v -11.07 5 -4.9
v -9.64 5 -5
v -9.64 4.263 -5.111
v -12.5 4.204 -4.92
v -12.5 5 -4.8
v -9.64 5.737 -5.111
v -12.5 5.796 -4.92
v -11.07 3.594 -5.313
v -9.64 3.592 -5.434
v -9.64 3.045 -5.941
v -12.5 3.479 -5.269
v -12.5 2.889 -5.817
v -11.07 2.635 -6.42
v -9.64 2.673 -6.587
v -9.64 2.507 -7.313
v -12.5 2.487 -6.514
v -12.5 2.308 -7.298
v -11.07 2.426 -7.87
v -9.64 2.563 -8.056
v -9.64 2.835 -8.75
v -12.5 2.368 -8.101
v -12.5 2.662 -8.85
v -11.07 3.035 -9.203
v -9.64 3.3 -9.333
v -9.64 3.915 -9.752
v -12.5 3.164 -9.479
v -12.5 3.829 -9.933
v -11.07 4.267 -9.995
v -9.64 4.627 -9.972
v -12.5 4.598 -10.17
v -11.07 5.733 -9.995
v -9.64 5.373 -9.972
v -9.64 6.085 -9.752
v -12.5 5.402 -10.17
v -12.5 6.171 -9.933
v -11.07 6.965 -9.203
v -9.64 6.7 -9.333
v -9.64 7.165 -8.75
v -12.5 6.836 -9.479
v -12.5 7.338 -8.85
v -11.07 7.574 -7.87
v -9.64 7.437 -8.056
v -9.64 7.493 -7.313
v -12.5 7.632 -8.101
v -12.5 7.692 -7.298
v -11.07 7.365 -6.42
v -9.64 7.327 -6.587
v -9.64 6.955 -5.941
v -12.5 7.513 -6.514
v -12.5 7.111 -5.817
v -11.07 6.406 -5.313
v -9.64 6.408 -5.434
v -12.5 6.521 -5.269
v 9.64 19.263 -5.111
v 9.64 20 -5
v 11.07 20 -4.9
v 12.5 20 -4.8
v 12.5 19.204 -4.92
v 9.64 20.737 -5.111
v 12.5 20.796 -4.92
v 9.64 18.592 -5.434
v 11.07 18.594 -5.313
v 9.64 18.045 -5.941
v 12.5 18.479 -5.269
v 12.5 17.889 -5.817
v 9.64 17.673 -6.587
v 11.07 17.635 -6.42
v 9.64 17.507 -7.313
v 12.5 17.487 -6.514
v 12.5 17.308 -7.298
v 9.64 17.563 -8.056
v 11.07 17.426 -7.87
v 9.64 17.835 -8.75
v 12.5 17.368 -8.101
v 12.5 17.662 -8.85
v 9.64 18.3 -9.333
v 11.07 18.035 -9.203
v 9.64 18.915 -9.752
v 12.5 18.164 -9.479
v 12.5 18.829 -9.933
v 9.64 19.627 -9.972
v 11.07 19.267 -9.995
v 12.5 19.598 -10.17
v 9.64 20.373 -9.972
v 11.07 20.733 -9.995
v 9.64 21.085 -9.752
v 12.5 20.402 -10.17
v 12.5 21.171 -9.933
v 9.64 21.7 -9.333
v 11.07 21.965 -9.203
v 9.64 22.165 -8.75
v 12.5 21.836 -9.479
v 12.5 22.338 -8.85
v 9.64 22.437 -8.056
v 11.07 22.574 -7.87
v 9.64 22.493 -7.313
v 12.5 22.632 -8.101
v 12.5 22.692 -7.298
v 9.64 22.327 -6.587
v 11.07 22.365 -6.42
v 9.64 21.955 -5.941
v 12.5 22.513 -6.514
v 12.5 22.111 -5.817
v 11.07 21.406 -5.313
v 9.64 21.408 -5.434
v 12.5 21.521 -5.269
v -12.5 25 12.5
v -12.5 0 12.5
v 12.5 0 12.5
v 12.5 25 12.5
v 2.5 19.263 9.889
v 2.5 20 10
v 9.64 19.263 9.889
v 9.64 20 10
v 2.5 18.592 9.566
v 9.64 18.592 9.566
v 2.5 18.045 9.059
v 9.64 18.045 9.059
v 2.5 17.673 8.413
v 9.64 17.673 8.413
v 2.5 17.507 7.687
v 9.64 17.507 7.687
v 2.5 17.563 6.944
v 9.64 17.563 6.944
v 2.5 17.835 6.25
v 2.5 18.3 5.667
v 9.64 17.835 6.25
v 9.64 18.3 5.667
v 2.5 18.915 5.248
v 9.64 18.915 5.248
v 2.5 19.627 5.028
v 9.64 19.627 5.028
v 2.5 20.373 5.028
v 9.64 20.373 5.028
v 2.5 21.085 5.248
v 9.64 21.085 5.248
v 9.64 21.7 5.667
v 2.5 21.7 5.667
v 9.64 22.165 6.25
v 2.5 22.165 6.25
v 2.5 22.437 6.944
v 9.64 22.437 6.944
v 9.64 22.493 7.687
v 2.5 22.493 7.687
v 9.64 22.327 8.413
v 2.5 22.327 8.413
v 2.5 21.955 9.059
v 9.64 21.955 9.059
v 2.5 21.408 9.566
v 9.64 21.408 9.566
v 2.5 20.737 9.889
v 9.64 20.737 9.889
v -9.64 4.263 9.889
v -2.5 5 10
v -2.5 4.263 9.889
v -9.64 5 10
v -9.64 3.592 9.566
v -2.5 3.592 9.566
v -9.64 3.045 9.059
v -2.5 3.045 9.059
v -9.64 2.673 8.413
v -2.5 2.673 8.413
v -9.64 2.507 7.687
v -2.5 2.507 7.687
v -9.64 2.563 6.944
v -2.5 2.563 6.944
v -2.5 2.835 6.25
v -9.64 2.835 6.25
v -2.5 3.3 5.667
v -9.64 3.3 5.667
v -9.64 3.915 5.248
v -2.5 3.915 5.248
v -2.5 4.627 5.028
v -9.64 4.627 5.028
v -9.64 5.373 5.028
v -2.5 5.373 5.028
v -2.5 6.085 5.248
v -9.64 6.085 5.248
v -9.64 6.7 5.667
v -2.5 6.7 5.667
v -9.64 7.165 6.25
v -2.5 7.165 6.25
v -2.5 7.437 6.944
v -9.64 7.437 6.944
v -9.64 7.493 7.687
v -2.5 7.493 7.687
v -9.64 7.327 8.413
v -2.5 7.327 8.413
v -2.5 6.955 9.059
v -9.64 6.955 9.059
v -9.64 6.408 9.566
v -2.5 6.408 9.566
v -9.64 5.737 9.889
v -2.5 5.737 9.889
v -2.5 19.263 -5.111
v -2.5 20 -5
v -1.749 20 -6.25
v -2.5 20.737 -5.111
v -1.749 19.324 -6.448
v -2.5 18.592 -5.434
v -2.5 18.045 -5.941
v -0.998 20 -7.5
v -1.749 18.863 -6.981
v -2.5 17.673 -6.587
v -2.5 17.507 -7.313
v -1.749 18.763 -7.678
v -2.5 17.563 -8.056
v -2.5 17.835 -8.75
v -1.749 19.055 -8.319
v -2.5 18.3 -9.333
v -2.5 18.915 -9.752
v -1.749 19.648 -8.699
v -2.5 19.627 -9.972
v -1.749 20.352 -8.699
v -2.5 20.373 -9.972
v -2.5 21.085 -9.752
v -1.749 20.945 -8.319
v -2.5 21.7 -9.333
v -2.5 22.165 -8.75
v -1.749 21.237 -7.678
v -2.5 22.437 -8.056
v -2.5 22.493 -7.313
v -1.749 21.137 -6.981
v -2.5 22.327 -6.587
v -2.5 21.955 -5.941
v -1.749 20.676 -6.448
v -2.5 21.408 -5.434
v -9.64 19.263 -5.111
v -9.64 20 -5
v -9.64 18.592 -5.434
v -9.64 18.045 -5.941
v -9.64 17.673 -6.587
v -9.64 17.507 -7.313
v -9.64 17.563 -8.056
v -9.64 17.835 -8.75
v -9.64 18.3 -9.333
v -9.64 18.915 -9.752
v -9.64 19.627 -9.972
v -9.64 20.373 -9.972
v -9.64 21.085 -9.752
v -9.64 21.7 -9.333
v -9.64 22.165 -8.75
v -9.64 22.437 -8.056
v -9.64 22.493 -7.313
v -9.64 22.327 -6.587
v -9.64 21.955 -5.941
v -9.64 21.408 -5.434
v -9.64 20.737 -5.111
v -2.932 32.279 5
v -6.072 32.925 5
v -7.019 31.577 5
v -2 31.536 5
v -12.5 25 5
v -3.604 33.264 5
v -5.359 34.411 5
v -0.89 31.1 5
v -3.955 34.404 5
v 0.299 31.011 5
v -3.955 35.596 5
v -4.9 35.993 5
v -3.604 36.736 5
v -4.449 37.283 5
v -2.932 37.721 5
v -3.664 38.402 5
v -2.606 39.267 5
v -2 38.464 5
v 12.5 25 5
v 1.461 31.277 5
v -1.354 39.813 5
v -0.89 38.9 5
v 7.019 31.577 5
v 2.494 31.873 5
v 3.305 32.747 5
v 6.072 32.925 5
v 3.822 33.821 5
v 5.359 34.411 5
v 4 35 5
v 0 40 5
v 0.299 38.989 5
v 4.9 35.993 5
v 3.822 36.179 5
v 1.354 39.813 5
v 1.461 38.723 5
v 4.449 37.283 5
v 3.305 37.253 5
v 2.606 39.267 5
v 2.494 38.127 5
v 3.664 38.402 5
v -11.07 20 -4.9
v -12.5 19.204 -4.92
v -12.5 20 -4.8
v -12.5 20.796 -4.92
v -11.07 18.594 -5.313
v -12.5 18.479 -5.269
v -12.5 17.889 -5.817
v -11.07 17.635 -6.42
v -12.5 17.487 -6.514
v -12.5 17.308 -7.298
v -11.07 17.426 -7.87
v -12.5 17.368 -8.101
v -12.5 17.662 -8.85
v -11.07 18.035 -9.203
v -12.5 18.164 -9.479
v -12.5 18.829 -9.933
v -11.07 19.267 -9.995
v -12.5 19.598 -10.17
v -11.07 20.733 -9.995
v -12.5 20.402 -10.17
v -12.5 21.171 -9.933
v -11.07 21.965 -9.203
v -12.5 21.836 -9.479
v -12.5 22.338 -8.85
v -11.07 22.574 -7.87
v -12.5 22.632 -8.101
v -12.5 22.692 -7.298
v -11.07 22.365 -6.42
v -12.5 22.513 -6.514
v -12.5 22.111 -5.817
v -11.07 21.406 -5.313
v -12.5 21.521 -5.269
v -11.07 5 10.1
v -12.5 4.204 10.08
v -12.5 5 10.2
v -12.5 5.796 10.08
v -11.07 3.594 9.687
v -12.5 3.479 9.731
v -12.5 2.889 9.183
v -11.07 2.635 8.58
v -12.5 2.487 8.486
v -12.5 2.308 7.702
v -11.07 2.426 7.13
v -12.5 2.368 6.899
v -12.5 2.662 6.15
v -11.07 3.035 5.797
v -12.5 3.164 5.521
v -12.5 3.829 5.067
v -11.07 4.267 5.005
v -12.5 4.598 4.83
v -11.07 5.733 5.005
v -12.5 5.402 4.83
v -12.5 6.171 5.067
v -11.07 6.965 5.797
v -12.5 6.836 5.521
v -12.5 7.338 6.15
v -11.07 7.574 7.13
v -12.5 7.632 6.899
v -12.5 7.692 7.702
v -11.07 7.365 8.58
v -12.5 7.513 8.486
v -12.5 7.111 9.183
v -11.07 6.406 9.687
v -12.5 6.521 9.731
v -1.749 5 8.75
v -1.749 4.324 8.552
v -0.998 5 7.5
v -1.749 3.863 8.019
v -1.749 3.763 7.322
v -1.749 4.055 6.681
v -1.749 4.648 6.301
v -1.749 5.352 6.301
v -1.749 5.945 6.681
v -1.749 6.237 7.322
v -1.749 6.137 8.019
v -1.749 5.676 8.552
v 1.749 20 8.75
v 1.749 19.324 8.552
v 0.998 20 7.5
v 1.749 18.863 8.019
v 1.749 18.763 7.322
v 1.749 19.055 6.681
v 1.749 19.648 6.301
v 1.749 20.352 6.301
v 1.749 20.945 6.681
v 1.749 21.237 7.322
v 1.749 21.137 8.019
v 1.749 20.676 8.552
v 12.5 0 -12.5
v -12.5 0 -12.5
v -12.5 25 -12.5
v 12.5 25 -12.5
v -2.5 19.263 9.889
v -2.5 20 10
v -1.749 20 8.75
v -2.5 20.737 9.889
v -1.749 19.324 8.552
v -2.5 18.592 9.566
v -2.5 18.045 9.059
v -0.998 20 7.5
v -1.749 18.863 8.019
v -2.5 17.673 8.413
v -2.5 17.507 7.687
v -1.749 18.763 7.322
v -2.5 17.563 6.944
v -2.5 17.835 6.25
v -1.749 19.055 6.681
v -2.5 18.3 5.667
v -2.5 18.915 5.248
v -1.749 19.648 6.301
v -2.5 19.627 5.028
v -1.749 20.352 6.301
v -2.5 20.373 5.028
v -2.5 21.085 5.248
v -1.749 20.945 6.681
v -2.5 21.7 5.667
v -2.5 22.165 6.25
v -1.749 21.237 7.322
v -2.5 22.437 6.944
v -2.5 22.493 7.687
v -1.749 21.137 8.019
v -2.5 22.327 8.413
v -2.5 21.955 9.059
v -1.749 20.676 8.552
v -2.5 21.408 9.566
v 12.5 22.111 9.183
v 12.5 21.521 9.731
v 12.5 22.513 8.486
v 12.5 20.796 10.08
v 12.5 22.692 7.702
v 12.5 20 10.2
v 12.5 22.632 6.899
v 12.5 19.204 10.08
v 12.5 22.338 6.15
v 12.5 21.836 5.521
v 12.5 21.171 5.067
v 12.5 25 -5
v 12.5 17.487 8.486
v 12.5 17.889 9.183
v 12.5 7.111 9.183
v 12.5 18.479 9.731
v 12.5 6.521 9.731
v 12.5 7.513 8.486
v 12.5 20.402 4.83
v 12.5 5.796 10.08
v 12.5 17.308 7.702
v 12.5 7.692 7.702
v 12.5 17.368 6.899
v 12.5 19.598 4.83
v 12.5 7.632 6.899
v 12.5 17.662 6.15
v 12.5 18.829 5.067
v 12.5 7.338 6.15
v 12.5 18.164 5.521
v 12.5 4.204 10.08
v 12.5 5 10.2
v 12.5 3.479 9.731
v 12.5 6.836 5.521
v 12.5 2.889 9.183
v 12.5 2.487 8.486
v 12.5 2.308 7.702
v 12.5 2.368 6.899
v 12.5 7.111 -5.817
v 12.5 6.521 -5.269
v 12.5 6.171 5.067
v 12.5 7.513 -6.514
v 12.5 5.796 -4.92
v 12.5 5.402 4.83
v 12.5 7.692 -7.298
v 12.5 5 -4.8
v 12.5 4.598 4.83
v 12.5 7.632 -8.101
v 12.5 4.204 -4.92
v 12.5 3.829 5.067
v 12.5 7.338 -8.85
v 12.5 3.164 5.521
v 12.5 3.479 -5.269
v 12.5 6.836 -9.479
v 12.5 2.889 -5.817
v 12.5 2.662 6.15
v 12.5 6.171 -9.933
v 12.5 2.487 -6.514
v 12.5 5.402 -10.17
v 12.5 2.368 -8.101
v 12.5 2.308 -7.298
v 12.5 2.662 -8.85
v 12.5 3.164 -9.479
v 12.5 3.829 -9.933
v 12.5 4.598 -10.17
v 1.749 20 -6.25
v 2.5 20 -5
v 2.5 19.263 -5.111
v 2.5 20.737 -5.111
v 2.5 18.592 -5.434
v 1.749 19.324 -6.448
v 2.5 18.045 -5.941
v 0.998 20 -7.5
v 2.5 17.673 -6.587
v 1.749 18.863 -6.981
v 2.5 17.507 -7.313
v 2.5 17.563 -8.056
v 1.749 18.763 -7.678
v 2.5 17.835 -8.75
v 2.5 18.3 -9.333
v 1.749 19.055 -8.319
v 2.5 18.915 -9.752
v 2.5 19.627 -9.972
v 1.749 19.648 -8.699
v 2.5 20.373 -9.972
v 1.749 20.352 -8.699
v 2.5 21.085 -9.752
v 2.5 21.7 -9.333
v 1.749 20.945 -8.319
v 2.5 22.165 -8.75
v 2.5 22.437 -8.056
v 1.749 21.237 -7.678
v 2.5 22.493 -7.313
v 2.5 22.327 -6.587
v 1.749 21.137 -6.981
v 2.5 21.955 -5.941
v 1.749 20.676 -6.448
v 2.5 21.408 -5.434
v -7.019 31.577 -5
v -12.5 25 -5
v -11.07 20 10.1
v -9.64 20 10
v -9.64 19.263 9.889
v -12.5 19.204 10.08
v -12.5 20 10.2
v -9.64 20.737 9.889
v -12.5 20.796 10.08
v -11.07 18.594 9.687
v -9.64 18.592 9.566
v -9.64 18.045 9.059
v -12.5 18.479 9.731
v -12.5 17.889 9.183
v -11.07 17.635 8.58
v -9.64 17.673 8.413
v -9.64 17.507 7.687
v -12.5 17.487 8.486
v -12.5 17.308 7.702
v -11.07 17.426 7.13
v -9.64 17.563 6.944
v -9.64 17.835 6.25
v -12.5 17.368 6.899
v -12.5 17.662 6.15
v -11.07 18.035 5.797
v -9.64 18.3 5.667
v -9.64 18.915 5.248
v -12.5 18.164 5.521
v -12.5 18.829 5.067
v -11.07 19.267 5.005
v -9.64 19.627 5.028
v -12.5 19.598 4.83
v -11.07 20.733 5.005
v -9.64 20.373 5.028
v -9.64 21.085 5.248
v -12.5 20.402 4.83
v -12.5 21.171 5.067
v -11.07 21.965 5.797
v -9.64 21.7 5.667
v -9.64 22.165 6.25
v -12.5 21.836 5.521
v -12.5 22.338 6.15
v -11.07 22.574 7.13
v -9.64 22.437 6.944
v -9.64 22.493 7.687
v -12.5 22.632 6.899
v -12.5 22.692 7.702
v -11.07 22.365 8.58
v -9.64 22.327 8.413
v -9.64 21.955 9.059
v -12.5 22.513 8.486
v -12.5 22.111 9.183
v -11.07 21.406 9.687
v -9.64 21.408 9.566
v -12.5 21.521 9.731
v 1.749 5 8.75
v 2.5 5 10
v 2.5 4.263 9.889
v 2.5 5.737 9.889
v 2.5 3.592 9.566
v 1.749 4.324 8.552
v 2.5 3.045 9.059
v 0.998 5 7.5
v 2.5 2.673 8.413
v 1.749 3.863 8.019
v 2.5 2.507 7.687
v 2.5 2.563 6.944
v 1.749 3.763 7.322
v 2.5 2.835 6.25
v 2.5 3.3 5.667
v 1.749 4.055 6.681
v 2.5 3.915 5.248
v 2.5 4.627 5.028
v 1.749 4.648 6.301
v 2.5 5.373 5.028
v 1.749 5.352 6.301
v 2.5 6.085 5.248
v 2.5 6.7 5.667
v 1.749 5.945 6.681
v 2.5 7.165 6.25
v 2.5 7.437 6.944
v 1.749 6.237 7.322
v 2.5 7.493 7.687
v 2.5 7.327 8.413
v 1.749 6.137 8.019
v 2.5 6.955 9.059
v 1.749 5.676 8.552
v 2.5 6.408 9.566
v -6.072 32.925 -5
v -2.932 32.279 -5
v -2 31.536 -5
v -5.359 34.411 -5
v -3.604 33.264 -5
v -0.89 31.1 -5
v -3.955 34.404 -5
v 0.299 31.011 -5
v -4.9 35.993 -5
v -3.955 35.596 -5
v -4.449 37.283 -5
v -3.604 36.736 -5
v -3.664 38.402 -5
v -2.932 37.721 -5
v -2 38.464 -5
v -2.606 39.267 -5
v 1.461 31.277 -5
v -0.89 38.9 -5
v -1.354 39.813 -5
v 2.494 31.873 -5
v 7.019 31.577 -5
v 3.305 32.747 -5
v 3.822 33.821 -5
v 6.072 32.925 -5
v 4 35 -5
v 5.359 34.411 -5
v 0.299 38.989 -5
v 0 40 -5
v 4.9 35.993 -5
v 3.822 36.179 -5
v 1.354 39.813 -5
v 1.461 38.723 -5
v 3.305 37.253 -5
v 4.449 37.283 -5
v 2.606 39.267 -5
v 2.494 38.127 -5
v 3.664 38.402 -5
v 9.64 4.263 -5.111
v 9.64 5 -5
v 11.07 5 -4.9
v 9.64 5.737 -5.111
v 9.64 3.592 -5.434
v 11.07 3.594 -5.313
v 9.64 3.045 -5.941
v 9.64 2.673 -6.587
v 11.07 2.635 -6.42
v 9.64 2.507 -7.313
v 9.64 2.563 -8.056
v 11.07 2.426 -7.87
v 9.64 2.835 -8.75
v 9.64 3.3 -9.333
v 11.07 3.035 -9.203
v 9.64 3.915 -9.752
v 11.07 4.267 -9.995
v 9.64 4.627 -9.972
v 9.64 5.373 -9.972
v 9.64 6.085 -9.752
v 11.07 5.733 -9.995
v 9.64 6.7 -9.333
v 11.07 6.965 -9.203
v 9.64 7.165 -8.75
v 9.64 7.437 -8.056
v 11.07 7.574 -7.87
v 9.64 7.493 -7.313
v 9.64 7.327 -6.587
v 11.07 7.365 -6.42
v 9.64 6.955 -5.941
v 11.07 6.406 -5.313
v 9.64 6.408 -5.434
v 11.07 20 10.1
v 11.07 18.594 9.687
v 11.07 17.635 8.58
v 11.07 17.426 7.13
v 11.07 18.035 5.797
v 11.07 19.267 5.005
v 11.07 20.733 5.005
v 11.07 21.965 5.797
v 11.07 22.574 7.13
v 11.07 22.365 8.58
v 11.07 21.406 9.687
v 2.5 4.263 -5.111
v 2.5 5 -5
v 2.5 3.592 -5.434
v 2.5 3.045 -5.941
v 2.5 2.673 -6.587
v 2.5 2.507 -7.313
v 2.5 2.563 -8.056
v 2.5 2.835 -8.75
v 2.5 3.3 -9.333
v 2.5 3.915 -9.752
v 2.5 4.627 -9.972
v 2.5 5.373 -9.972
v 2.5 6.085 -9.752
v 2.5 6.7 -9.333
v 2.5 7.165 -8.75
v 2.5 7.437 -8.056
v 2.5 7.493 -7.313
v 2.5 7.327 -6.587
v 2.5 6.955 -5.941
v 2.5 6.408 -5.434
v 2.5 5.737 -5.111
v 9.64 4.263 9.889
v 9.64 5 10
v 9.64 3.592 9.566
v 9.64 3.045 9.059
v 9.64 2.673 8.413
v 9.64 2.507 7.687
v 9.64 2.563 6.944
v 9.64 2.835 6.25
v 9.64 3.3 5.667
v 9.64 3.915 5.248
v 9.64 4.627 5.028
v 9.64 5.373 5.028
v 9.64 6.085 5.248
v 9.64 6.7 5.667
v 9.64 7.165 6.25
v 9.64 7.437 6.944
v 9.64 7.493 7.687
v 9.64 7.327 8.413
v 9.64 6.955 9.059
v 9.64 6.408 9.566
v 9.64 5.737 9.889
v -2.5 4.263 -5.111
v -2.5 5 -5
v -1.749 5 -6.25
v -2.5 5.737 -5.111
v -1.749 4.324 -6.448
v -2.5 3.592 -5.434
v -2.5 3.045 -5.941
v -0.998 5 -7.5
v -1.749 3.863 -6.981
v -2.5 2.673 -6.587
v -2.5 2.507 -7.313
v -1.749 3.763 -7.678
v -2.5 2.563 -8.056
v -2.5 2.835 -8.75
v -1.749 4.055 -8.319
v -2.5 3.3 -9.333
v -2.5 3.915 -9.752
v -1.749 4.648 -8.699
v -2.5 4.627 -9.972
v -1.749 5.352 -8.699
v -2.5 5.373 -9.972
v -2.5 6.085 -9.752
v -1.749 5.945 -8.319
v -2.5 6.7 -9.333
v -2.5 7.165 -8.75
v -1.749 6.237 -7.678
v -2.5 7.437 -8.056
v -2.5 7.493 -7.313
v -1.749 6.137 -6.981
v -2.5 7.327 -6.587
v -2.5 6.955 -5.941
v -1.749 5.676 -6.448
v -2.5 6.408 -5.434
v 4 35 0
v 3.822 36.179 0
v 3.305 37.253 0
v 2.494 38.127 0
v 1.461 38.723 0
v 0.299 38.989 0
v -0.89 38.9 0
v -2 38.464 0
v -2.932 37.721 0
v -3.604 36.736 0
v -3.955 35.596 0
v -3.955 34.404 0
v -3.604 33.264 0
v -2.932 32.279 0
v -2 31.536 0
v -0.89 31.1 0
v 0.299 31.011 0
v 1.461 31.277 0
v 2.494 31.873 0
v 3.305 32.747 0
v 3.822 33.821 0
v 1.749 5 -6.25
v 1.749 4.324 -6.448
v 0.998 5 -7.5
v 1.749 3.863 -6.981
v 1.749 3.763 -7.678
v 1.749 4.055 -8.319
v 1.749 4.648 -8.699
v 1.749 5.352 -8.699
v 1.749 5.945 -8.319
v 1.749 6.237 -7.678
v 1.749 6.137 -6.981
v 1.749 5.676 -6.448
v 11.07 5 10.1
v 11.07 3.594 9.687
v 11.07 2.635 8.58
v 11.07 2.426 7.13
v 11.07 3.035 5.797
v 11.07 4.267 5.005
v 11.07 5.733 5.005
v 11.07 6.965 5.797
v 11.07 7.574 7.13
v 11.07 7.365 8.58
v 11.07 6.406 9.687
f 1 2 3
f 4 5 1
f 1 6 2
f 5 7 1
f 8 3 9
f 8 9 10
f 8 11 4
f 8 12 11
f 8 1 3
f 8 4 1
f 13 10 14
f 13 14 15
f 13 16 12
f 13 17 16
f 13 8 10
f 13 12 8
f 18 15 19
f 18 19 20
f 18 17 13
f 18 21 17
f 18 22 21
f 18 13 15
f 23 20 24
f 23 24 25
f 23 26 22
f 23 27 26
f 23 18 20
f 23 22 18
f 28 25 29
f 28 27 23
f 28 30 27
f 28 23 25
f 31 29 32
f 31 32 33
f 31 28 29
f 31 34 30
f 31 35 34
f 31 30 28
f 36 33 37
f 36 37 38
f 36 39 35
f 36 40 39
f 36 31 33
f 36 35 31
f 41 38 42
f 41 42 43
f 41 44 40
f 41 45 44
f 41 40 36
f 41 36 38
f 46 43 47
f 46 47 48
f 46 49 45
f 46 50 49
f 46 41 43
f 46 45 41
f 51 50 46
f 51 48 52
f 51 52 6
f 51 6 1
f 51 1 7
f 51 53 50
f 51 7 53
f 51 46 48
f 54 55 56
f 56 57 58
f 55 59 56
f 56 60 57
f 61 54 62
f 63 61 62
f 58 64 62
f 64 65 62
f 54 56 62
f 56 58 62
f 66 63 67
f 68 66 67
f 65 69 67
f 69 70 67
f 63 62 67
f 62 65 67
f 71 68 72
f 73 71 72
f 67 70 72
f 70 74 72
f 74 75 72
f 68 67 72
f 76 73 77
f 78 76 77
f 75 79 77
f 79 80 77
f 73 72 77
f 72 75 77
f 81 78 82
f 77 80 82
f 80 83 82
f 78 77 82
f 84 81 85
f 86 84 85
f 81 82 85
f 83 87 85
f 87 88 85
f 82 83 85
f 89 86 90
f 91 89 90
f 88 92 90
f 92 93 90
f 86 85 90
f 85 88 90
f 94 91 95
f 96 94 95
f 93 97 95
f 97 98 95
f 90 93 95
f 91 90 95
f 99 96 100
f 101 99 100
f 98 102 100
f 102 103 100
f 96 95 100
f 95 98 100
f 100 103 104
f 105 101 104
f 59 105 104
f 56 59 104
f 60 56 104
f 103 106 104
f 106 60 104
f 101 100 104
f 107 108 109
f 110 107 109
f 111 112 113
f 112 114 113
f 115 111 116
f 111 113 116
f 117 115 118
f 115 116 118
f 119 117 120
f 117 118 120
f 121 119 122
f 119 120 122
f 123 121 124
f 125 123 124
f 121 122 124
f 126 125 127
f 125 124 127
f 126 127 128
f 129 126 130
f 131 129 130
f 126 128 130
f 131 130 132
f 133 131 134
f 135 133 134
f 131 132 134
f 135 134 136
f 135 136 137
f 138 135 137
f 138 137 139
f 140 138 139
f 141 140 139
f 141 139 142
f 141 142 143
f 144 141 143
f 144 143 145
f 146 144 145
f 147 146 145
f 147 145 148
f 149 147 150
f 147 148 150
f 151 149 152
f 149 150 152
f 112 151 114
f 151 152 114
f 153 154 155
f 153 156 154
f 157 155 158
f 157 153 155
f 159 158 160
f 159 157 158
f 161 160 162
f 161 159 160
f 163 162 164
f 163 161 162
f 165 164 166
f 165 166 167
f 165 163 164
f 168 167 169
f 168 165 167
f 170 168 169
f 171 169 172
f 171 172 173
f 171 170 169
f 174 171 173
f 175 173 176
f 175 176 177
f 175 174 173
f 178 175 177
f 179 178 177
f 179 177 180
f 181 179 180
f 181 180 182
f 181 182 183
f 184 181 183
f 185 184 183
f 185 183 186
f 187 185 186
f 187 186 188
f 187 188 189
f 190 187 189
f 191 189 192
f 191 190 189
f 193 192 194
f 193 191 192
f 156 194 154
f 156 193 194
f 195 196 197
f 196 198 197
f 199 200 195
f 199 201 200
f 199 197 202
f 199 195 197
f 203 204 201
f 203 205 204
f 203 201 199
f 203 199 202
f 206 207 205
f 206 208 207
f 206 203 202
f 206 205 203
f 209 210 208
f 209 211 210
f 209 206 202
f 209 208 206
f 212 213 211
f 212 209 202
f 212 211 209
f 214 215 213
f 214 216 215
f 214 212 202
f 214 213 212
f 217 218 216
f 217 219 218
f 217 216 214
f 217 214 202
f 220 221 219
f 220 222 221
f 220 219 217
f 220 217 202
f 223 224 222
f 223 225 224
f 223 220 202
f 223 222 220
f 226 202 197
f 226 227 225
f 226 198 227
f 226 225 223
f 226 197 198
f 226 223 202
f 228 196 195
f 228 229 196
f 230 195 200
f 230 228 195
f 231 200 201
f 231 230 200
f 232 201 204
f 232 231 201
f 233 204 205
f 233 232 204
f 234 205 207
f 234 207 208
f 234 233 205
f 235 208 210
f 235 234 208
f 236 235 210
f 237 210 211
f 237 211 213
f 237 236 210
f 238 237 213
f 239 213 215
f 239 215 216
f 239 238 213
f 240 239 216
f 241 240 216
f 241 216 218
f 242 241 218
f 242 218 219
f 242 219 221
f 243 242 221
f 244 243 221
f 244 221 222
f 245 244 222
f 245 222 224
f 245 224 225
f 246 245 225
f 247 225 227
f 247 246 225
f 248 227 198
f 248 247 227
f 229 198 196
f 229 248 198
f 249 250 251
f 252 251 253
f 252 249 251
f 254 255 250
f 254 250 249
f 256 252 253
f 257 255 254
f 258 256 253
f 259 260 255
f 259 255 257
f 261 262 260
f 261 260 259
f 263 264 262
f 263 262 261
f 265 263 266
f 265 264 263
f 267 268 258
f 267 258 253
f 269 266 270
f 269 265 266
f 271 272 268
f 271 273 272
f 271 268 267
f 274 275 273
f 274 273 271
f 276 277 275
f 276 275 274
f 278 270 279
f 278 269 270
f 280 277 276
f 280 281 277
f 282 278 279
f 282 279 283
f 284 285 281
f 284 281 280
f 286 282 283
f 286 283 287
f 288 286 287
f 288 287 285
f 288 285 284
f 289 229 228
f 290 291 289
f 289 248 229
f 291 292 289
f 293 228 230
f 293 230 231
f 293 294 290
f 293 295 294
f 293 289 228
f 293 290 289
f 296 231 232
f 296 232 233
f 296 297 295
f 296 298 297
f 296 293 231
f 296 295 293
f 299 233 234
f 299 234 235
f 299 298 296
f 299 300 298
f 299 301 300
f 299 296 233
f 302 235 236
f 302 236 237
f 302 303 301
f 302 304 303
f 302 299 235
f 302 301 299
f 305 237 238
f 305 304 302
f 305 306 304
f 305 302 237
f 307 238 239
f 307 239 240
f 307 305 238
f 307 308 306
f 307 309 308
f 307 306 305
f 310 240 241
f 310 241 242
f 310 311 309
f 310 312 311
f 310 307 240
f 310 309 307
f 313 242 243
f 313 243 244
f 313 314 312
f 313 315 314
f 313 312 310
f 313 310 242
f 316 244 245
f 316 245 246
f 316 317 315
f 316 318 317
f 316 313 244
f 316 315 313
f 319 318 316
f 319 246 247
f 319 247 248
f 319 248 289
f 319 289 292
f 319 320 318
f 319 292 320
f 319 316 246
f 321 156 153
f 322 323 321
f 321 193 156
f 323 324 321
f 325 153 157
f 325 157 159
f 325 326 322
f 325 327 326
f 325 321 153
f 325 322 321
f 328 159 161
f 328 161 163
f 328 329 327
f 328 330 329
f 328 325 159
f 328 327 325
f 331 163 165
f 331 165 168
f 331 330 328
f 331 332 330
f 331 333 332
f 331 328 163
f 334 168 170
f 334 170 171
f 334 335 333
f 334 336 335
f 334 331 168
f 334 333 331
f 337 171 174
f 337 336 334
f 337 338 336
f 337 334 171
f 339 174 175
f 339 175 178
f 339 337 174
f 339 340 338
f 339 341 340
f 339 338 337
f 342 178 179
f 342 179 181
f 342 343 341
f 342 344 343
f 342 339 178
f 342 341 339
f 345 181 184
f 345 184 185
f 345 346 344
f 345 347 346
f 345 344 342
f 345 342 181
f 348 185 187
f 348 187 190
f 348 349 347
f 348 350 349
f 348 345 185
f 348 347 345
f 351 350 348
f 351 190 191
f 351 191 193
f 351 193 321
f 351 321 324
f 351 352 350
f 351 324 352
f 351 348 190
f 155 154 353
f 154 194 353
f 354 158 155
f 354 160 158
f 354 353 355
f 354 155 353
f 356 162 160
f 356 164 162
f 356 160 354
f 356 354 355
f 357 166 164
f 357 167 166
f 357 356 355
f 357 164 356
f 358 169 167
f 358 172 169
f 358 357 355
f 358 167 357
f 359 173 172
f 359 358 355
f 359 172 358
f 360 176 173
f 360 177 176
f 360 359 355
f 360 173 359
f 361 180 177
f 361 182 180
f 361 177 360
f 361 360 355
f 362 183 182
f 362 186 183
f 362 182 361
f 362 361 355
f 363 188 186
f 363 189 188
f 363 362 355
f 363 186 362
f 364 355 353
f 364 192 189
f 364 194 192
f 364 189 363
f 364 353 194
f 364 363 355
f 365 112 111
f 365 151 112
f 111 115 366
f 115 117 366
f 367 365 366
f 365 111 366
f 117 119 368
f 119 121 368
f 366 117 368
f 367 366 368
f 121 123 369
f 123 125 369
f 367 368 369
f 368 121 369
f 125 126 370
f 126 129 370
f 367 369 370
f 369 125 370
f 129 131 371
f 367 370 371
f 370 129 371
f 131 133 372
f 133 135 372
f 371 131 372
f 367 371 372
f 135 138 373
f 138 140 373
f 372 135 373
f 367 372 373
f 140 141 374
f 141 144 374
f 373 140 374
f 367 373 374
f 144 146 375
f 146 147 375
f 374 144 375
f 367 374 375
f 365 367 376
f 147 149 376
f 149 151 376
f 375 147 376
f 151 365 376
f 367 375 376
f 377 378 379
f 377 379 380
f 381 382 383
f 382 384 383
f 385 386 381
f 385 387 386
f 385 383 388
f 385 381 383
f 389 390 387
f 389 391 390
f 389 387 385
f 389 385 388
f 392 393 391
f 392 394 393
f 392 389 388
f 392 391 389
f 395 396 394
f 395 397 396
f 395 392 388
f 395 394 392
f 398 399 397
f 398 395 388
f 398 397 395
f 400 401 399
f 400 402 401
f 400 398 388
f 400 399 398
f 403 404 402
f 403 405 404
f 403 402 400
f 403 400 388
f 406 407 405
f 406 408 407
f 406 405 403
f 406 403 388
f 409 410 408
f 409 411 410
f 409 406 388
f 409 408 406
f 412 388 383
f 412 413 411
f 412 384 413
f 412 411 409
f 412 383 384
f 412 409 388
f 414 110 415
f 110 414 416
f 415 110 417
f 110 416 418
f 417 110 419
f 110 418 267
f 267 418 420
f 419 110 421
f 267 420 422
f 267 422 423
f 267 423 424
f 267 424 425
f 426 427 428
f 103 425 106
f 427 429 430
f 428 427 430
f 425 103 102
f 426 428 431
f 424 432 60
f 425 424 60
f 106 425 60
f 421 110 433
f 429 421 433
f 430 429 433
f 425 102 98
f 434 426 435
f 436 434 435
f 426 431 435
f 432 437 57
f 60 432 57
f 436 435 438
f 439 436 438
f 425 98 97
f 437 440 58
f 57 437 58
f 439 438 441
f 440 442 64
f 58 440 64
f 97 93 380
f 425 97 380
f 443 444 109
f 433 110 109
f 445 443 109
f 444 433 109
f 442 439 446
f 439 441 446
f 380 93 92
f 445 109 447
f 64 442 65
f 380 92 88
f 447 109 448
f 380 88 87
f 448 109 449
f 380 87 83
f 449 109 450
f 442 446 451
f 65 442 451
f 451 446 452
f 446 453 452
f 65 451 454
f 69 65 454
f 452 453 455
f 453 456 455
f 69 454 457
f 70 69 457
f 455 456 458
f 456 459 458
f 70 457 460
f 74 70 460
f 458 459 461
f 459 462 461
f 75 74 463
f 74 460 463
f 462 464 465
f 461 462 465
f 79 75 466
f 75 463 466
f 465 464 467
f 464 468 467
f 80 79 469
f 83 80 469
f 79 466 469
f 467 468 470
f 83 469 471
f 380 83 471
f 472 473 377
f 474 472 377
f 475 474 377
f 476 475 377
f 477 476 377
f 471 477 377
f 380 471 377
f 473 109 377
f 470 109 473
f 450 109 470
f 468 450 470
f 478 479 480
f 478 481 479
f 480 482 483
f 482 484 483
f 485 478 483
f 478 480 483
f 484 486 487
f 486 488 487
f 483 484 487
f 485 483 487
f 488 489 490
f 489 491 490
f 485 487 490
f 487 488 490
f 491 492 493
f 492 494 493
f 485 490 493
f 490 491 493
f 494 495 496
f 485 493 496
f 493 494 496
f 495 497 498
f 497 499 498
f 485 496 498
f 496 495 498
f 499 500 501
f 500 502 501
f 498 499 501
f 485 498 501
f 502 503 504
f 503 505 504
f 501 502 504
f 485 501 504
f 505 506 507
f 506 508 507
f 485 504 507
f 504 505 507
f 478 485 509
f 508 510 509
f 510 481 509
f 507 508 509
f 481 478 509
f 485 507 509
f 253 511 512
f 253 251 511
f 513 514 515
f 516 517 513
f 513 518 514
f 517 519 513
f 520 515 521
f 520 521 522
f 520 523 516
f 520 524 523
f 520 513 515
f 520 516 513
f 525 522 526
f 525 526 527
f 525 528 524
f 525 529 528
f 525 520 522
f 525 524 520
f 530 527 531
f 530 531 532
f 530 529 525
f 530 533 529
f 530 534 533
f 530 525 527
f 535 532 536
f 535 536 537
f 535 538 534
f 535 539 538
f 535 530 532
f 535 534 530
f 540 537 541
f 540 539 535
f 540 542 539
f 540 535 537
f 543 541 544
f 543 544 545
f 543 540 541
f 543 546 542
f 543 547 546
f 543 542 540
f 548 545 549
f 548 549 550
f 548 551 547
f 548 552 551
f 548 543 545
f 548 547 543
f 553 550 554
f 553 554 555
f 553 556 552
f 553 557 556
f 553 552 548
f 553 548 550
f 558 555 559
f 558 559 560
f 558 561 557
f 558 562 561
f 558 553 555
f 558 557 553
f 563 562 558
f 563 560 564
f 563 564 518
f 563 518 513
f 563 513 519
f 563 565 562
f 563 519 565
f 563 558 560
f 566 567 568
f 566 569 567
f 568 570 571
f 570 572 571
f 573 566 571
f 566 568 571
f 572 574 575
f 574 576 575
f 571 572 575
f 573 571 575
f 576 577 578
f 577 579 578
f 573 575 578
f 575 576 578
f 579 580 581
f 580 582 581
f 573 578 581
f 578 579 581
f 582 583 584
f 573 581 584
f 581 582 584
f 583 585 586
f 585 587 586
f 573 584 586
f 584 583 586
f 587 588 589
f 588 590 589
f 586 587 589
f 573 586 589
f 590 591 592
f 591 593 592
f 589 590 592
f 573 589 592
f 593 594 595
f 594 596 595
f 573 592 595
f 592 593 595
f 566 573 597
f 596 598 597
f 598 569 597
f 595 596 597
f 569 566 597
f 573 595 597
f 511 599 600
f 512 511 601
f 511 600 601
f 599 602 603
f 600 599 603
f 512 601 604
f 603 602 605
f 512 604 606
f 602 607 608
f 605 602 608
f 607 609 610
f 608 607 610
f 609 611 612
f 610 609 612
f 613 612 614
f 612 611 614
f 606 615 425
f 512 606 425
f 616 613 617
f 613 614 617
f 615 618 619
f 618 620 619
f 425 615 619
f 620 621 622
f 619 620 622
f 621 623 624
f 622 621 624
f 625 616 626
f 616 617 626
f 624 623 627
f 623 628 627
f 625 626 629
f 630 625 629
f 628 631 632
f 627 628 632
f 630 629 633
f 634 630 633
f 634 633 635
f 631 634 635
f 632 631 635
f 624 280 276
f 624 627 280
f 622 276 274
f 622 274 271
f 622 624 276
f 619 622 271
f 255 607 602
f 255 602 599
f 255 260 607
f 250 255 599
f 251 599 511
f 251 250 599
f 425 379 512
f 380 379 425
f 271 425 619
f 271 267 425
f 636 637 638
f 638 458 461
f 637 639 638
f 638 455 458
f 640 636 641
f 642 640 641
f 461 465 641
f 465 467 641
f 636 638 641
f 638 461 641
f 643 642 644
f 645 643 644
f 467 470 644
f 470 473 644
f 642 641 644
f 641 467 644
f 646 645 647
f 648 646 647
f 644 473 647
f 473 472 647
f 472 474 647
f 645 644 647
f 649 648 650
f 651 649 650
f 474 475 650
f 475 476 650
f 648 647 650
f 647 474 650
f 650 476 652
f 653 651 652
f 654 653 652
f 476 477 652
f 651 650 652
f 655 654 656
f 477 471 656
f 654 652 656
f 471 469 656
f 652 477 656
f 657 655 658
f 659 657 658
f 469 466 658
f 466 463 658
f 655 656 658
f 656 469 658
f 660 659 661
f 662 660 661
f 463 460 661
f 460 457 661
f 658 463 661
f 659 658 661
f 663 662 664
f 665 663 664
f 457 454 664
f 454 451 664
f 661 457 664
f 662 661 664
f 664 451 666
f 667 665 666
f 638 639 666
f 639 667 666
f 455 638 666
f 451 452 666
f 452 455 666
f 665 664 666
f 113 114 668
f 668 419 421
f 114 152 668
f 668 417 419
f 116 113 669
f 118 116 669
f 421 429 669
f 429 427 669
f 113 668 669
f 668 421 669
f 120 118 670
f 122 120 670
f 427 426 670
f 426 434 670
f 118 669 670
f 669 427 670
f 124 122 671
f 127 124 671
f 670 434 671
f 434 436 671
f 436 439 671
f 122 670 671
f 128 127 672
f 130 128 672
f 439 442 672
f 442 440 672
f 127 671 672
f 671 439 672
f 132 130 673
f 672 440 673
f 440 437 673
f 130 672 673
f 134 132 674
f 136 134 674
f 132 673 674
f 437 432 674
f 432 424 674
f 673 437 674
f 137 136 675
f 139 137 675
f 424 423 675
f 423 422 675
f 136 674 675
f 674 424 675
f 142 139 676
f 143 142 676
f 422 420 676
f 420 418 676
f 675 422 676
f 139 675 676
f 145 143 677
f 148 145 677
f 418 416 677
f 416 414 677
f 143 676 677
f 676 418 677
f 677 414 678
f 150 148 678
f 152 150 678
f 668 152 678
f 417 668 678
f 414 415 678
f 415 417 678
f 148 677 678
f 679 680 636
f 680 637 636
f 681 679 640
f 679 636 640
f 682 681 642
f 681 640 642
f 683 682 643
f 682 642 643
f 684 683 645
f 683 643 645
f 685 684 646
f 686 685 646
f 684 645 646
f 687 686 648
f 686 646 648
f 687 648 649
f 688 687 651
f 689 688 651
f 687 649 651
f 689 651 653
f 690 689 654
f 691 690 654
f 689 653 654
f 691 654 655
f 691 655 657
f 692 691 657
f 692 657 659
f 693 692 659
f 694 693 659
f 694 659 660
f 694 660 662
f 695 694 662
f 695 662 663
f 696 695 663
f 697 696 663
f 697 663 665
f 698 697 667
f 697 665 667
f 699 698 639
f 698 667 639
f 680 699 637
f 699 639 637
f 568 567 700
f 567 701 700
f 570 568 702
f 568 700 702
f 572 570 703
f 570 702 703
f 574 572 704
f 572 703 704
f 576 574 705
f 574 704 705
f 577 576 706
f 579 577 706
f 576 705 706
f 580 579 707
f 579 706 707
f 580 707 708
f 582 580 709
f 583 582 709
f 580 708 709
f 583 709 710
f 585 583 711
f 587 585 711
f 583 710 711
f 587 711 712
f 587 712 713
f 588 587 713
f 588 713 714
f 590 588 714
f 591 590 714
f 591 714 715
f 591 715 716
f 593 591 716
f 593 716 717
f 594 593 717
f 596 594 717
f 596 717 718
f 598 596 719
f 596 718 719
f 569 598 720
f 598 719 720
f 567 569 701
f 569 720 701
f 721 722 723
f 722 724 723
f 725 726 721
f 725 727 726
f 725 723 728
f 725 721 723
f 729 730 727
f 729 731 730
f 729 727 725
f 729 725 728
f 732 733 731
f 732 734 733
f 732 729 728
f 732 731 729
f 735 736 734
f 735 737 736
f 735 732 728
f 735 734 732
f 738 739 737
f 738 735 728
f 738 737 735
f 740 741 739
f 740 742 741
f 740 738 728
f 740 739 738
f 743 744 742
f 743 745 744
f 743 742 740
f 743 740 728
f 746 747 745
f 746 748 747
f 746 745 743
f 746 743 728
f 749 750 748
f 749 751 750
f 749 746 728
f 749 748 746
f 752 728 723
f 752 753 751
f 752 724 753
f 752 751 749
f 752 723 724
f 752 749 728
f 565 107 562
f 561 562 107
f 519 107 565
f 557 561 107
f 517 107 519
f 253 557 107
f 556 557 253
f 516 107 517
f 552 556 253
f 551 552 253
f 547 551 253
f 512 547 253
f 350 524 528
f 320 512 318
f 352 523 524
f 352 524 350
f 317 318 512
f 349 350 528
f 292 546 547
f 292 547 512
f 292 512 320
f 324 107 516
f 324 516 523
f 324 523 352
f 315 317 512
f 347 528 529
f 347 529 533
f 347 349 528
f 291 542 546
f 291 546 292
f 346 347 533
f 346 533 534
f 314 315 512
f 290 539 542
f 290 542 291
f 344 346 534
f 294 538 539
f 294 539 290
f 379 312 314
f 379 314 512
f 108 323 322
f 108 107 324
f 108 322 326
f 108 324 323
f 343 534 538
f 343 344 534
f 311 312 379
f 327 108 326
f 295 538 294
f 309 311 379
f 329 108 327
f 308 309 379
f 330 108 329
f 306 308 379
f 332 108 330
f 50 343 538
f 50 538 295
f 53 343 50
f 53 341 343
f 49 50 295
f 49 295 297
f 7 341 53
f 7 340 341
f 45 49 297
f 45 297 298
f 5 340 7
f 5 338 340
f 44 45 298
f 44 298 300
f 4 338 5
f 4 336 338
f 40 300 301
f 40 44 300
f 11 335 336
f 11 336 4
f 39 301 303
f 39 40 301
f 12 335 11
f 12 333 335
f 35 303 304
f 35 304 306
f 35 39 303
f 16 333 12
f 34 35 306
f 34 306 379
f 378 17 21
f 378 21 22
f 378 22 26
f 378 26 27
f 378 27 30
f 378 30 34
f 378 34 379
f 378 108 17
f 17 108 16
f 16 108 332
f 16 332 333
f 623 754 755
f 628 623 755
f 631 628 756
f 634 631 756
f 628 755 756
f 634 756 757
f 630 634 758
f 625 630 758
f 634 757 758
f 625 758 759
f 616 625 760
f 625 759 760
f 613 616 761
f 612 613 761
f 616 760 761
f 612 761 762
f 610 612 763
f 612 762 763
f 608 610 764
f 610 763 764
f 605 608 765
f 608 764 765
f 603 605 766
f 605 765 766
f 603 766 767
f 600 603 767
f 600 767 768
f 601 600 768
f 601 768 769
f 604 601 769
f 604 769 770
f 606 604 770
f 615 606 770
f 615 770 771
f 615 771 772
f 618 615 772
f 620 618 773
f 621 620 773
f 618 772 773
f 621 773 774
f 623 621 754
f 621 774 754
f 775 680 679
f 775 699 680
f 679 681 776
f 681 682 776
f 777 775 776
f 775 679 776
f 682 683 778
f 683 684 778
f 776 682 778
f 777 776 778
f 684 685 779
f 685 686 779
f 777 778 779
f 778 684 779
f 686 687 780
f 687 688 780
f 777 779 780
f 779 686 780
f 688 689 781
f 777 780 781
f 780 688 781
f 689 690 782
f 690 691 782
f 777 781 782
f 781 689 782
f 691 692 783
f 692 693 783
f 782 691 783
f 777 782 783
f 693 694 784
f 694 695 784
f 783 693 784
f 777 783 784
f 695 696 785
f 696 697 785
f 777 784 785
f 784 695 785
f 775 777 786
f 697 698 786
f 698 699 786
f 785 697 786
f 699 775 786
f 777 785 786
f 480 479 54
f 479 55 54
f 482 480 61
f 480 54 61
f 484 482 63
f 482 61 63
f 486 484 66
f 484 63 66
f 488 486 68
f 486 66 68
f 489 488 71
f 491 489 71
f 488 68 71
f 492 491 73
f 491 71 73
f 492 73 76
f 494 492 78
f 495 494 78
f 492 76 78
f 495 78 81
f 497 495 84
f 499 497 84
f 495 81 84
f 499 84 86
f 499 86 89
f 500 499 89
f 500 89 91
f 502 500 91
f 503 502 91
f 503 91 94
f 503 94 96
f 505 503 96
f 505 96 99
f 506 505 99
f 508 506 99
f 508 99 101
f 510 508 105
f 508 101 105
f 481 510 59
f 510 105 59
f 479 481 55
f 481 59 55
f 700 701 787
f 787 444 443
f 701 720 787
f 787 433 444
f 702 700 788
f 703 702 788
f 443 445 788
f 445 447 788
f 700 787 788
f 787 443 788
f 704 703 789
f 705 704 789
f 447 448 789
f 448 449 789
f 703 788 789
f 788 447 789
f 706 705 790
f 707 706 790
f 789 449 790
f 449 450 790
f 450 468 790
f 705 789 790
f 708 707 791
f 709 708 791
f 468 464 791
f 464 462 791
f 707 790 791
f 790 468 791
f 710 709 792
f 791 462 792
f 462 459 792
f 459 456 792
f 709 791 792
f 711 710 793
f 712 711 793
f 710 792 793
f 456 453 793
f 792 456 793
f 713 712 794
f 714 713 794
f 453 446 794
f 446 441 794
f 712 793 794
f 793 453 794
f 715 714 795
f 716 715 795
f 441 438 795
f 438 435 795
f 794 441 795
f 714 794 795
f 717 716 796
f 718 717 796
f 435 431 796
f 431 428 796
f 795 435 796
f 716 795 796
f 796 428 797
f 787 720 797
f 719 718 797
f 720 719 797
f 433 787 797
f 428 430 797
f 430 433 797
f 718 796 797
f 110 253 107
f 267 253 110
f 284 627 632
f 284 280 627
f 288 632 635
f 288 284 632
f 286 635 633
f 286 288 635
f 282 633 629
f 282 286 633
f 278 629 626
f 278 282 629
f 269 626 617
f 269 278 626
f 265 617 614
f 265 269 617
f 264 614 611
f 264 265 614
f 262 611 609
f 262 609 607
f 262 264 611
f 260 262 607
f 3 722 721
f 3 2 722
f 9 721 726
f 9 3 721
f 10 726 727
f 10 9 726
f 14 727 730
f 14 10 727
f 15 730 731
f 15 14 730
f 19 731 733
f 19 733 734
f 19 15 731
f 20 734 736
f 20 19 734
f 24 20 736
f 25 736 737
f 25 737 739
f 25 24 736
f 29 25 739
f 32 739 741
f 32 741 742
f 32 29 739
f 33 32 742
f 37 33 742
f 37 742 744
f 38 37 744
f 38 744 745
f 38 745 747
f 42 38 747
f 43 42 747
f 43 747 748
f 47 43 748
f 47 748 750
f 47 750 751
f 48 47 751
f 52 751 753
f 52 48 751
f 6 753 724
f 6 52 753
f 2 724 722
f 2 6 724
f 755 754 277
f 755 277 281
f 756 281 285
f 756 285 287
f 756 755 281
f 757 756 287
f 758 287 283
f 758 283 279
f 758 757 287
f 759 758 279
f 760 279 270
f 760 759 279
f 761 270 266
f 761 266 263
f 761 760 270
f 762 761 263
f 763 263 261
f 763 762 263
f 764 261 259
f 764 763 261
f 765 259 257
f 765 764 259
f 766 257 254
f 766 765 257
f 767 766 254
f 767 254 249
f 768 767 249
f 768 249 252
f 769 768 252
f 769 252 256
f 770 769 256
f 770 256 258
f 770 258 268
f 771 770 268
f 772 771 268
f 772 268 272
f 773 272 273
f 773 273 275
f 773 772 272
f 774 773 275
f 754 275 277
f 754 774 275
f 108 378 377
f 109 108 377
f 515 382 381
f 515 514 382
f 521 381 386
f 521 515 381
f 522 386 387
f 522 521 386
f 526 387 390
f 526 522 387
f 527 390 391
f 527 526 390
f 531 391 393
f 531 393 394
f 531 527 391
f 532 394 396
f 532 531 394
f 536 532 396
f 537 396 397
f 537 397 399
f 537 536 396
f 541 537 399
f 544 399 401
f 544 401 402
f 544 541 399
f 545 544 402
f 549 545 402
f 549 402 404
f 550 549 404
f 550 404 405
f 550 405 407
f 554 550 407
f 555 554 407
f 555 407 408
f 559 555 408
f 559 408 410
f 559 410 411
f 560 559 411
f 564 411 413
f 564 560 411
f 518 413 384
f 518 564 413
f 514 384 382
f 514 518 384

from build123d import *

# Parameters (mm, degrees)
SKETCH2_W                = 25
SKETCH2_H                = 25
BOSS_EXTRUDE1_DEPTH      = 25
LPATTERN1_COUNT          = 2
LPATTERN1_PITCH          = 15
LPATTERN1_COUNT_DIR2     = 2
LPATTERN1_PITCH_DIR2     = 15
SKETCH6_R                = 4
BOSS_EXTRUDE3_DEPTH      = 5
BOSS_EXTRUDE3_DEPTH_BACK = 5
FILLET4_R                = 10


with BuildPart() as part:
    # Sketch2 → Boss-Extrude1 (new body)
    with BuildSketch(Plane(origin=(0, 0, 0), x_dir=(1, 0, 0), z_dir=(0, 1, 0))):
        Rectangle(SKETCH2_W, SKETCH2_H)
    extrude(amount=BOSS_EXTRUDE1_DEPTH)

    # Sketch4 → CSK for M3 Oval Head Machine Screw1 (revolve, cut)
    with BuildSketch(Plane(origin=(-12.5, 20, -7.5), x_dir=(0, 0, 1), z_dir=(0, 1, 0))):
        Polygon((0, 0), (0, 11.502151548), (2.5, 10), (2.5, 2.860133251), (2.7, 0), align=None)
    csk_for_m3_oval_head_machine_screw1 = revolve(axis=Axis((-18.85, 20, -7.5), (1, 0, 0)), mode=Mode.SUBTRACT)

    # LPattern1: CSK for M3 Oval Head Machine Screw1 2 × 2
    with Locations(*[(0, -i * LPATTERN1_PITCH, j * LPATTERN1_PITCH_DIR2) for i in range(LPATTERN1_COUNT) for j in range(LPATTERN1_COUNT_DIR2) if (i, j) != (0, 0)]):
        add(csk_for_m3_oval_head_machine_screw1, mode=Mode.SUBTRACT)

    # Mirror1: CSK for M3 Oval Head Machine Screw1 across plane
    add(csk_for_m3_oval_head_machine_screw1.mirror(Plane(origin=(0, 0, 0), x_dir=(0, 0, 1), z_dir=(1, 0, 0))), mode=Mode.SUBTRACT)

    # Mirror1 copy 1 sketch → Mirror1 copy 1 (revolve, cut)
    with BuildSketch(Plane(origin=(12.5, 20, 7.5), x_dir=(0, 0, 1), z_dir=(0, 1, 0))):
        Polygon((0, 0), (0, -11.502151548), (2.5, -10), (2.5, -2.860133251), (2.7, 0), align=None)
    revolve(axis=Axis((18.85, 20, 7.5), (1, 0, 0)), mode=Mode.SUBTRACT)

    # Mirror1 copy 2 sketch → Mirror1 copy 2 (revolve, cut)
    with BuildSketch(Plane(origin=(12.5, 5, -7.5), x_dir=(0, 0, 1), z_dir=(0, 1, 0))):
        Polygon((0, 0), (0, -11.502151548), (2.5, -10), (2.5, -2.860133251), (2.7, 0), align=None)
    revolve(axis=Axis((18.85, 5, -7.5), (1, 0, 0)), mode=Mode.SUBTRACT)

    # Mirror1 copy 3 sketch → Mirror1 copy 3 (revolve, cut)
    with BuildSketch(Plane(origin=(12.5, 5, 7.5), x_dir=(0, 0, 1), z_dir=(0, 1, 0))):
        Polygon((0, 0), (0, -11.502151548), (2.5, -10), (2.5, -2.860133251), (2.7, 0), align=None)
    revolve(axis=Axis((18.85, 5, 7.5), (1, 0, 0)), mode=Mode.SUBTRACT)

    # Sketch6 → Boss-Extrude3 (add, two sides)
    with BuildSketch(Plane.XY) as boss_extrude3_sk:
        with BuildLine():
            ThreePointArc((4.918032787, 34.098360656), (0, 40), (-4.918032787, 34.098360656))
            Line((-4.918032787, 34.098360656), (-12.5, 25))
            Line((-12.5, 25), (12.5, 25))
            Line((12.5, 25), (4.918032787, 34.098360656))
        make_face()
        with Locations((0, 35)):
            Circle(SKETCH6_R, mode=Mode.SUBTRACT)
    extrude(amount=BOSS_EXTRUDE3_DEPTH)
    extrude(boss_extrude3_sk.sketch, amount=-BOSS_EXTRUDE3_DEPTH_BACK)

    # Fillet4
    fillet4_edges = [part.edges().sort_by_distance(p)[0] for p in [
        (-4.918032787, 34.098360656, 0),
        (4.918032787, 34.098360656, 0),
    ]]
    fillet(fillet4_edges, radius=FILLET4_R)


solid = part.part
